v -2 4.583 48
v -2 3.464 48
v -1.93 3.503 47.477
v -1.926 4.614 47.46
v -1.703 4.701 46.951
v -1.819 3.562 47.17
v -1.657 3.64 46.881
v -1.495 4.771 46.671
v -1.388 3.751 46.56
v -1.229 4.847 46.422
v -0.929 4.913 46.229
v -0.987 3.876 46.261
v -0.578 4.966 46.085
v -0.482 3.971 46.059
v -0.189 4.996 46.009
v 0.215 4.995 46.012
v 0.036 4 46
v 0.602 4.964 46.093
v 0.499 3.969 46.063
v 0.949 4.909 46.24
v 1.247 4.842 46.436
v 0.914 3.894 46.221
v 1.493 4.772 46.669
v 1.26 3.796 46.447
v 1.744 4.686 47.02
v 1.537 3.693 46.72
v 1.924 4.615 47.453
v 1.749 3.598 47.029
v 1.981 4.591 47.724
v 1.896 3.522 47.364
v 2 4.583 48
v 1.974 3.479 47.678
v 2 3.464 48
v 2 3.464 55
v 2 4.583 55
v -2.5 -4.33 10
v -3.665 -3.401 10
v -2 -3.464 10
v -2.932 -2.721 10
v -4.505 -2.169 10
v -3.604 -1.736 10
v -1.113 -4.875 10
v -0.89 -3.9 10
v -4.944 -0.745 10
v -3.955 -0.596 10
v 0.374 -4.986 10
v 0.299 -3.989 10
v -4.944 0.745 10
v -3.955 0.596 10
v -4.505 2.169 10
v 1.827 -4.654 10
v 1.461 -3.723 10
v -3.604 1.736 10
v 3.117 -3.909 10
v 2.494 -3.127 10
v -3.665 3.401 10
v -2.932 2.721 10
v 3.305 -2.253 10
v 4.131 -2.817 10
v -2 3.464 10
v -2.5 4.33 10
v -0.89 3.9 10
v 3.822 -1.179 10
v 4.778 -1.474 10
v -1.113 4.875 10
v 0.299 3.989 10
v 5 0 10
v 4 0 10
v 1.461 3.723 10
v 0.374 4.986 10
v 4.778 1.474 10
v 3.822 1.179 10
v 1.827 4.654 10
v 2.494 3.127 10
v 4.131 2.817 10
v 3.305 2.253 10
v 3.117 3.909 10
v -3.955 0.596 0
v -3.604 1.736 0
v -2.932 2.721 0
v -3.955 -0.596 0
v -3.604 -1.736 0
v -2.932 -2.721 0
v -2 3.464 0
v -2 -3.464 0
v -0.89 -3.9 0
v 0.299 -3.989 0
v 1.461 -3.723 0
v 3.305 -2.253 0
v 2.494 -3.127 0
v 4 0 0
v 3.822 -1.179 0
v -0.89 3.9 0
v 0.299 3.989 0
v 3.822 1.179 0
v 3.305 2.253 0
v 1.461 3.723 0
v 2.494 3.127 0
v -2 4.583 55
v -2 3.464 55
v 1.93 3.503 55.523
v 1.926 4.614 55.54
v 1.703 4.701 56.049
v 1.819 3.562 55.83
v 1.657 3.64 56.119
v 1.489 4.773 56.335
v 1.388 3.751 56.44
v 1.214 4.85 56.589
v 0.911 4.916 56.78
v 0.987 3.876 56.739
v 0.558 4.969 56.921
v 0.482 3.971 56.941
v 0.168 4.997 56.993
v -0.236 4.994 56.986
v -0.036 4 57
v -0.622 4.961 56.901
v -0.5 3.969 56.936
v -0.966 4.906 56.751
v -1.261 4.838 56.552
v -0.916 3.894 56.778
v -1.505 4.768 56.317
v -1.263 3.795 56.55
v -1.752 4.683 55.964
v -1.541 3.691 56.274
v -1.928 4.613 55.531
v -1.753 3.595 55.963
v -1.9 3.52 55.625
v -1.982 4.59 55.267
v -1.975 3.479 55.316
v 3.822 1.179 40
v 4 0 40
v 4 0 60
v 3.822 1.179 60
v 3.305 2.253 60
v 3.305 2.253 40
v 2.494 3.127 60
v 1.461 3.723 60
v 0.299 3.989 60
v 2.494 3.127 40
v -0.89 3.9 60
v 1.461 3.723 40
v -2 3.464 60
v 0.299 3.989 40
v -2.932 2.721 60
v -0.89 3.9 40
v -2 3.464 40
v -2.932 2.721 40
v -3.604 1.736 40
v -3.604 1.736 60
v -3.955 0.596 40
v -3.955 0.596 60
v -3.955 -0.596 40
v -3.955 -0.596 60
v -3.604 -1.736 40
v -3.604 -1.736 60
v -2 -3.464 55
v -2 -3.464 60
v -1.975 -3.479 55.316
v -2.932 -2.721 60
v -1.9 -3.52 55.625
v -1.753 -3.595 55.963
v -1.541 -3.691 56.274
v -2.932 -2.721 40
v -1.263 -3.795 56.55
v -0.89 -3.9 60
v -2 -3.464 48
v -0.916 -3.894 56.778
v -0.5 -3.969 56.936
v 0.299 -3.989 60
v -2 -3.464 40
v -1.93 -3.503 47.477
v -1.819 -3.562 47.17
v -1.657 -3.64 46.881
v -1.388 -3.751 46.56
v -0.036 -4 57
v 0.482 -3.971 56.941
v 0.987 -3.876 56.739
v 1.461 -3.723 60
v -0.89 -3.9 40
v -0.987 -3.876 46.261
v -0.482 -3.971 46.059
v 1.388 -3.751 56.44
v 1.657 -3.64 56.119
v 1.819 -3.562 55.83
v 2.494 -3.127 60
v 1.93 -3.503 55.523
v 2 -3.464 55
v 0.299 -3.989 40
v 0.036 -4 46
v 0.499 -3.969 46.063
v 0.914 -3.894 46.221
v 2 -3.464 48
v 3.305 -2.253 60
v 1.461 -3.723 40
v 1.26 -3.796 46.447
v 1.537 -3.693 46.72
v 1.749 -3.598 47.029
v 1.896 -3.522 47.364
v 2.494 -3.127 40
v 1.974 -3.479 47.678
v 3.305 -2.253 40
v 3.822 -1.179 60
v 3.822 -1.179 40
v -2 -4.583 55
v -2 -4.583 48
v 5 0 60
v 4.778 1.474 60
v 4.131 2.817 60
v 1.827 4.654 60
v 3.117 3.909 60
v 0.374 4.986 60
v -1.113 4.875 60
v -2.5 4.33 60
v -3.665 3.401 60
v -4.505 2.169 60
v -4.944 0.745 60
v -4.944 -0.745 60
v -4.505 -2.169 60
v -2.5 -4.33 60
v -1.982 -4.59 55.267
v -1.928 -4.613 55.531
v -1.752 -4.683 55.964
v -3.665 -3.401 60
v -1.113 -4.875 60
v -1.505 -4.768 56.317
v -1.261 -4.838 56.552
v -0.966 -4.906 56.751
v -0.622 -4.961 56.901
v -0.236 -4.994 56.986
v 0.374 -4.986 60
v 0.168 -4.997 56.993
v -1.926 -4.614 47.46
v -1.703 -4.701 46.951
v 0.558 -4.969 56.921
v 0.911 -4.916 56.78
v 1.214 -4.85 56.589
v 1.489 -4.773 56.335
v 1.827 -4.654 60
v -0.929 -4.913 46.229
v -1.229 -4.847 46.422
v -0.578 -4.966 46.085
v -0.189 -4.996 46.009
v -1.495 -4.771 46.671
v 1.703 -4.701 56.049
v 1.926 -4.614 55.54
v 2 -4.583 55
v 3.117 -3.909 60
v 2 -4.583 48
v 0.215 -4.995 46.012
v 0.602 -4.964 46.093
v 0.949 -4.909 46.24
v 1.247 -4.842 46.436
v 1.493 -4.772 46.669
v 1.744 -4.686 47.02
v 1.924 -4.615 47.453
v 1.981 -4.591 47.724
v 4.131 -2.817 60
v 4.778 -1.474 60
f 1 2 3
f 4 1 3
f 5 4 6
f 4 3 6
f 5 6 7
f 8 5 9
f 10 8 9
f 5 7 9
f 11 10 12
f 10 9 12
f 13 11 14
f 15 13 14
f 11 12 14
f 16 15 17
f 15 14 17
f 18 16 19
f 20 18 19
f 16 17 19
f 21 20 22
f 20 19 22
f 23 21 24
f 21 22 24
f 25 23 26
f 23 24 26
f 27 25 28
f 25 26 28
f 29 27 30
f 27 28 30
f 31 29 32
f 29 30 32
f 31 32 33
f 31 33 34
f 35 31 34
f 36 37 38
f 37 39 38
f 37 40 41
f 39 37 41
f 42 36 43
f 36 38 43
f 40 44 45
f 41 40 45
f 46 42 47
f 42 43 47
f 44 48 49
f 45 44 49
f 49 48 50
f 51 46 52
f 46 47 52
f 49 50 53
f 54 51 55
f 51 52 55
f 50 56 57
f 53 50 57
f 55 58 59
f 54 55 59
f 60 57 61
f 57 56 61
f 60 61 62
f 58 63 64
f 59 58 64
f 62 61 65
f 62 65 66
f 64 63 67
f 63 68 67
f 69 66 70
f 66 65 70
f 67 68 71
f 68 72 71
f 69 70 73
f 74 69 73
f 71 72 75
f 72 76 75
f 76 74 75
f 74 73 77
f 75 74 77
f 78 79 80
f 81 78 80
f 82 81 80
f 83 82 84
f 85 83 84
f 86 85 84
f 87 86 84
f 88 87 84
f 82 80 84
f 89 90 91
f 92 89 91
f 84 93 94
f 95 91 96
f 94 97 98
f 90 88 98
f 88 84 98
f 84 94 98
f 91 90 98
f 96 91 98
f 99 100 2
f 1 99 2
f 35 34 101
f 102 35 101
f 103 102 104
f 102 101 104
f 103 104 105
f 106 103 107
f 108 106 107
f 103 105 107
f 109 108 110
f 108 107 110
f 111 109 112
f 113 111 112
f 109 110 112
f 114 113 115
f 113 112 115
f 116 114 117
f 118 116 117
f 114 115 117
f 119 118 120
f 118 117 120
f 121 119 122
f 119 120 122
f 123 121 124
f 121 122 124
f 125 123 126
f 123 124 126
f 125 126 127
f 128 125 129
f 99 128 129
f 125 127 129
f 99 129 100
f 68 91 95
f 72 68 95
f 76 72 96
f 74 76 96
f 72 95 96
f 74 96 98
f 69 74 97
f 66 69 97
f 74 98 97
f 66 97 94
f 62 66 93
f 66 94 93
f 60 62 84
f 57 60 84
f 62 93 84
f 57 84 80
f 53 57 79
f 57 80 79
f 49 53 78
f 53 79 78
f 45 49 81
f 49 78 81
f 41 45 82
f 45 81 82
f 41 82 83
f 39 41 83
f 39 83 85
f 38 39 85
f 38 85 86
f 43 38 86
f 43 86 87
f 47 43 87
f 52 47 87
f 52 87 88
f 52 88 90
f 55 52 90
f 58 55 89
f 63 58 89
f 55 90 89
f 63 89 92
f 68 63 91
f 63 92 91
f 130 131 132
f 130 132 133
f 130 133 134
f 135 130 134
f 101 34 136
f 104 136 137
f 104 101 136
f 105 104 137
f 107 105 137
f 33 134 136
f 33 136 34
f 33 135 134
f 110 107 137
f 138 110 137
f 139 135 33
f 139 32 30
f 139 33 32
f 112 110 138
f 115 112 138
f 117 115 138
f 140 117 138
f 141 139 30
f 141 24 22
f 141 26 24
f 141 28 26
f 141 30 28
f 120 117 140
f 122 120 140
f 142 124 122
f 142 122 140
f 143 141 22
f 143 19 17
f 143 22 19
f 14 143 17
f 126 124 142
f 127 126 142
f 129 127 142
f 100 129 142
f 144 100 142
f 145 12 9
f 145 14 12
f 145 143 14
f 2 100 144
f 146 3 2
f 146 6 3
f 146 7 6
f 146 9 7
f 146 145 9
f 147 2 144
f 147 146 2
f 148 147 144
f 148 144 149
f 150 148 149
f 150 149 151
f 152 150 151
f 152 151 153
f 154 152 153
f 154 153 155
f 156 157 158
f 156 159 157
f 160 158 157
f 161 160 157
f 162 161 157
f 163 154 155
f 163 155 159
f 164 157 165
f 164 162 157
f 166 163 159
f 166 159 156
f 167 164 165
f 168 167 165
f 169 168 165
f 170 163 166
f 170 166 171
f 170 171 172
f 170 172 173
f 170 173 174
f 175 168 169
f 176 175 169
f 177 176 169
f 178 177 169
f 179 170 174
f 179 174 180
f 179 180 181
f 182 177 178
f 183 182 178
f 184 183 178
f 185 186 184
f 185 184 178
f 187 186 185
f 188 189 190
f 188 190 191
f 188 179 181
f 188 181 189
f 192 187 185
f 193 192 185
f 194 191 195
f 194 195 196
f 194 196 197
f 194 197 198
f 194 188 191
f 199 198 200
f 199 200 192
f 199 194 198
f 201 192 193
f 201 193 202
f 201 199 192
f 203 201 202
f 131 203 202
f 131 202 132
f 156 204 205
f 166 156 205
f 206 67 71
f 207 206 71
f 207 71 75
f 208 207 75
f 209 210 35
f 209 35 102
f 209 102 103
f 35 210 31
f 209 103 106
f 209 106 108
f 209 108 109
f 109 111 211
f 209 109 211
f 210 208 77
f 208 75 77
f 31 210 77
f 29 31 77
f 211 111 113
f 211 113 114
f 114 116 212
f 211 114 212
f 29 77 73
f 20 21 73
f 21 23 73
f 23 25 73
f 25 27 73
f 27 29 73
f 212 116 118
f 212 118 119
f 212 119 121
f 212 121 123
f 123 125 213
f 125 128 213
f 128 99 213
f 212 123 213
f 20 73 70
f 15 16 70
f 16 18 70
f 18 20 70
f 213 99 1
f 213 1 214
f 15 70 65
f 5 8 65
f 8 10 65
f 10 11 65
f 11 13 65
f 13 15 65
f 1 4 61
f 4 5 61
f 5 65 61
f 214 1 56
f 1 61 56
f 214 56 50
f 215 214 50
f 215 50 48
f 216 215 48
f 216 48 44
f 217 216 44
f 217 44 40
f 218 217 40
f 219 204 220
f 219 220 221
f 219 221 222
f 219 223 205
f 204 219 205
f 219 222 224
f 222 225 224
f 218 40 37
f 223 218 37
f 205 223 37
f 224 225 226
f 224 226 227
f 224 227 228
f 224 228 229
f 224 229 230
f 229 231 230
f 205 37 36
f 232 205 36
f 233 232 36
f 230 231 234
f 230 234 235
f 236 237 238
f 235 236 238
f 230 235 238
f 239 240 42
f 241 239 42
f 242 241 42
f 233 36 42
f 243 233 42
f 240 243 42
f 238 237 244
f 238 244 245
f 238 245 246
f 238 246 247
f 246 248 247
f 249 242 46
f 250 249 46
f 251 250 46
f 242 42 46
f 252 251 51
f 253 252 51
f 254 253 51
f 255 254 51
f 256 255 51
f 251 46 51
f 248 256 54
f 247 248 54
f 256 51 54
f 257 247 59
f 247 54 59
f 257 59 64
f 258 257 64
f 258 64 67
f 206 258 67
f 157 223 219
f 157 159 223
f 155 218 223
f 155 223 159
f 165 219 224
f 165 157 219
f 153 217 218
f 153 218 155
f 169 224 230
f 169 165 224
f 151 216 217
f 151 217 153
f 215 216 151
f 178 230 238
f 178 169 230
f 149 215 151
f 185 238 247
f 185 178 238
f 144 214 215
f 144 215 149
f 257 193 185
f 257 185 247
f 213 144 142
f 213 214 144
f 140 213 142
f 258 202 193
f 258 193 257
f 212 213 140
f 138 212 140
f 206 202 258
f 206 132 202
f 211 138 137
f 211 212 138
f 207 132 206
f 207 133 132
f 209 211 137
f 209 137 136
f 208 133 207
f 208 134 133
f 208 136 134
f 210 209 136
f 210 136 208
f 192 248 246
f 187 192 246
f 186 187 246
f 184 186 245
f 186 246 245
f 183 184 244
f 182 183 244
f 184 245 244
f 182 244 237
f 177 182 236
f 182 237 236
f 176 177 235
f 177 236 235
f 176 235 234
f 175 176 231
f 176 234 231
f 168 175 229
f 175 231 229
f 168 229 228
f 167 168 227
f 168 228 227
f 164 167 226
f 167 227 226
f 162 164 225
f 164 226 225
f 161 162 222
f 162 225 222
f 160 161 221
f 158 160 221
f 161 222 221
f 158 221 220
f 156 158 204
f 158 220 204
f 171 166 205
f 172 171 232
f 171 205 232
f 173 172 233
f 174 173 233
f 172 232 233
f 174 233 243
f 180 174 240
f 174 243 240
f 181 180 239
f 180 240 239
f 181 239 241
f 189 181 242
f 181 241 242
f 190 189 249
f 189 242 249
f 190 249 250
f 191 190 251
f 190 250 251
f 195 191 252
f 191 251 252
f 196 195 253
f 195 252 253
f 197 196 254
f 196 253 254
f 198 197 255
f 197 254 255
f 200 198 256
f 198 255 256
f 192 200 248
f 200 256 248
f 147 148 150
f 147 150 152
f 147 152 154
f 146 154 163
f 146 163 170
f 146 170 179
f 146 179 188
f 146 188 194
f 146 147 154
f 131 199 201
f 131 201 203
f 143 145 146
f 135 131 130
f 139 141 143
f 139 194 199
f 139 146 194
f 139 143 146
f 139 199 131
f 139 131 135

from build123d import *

# Parameters (mm, degrees)
SKETCH1_R               = 5
BOSS_EXTRUDE1_DEPTH     = 60
SKETCH1_4_R             = 5
SKETCH1_4_R_2           = 4
CUT_EXTRUDE1_DEPTH      = 10
CUT_EXTRUDE2_START      = 40
SKETCH1_5_R             = 4
CUT_EXTRUDE2_DEPTH      = 20
CUT_EXTRUDE3_DEPTH      = 61.415229868
CUT_EXTRUDE3_DEPTH_BACK = 61.415229868


with BuildPart() as part:
    # Sketch1 → Boss-Extrude1 (new body)
    with BuildSketch(Plane.XY):
        Circle(SKETCH1_R)
    extrude(amount=BOSS_EXTRUDE1_DEPTH)

    # Sketch1<4> → Cut-Extrude1 (cut)
    with BuildSketch(Plane.XY):
        Circle(SKETCH1_4_R)
        Circle(SKETCH1_4_R_2, mode=Mode.SUBTRACT)
    extrude(amount=CUT_EXTRUDE1_DEPTH, mode=Mode.SUBTRACT)

    # Sketch1<5> → Cut-Extrude2 (cut)
    with BuildSketch(Plane.XY.offset(CUT_EXTRUDE2_START)):
        Circle(SKETCH1_5_R)
    extrude(amount=CUT_EXTRUDE2_DEPTH, mode=Mode.SUBTRACT)

    # Sketch2 → Cut-Extrude3 (cut, two sides: drawn at the far end of the back side and taken through both)
    with BuildSketch(Plane(origin=(0, 0, 0), x_dir=(1, 0, 0), z_dir=(0, 1, 0)).offset(-CUT_EXTRUDE3_DEPTH_BACK)):
        with BuildLine():
            Line((2, -48), (2, -55))
            ThreePointArc((2, -55), (0, -57), (-2, -55))
            Line((-2, -55), (-2, -48))
            ThreePointArc((-2, -48), (0, -46), (2, -48))
        make_face()
    extrude(amount=CUT_EXTRUDE3_DEPTH + CUT_EXTRUDE3_DEPTH_BACK, mode=Mode.SUBTRACT)


solid = part.part
